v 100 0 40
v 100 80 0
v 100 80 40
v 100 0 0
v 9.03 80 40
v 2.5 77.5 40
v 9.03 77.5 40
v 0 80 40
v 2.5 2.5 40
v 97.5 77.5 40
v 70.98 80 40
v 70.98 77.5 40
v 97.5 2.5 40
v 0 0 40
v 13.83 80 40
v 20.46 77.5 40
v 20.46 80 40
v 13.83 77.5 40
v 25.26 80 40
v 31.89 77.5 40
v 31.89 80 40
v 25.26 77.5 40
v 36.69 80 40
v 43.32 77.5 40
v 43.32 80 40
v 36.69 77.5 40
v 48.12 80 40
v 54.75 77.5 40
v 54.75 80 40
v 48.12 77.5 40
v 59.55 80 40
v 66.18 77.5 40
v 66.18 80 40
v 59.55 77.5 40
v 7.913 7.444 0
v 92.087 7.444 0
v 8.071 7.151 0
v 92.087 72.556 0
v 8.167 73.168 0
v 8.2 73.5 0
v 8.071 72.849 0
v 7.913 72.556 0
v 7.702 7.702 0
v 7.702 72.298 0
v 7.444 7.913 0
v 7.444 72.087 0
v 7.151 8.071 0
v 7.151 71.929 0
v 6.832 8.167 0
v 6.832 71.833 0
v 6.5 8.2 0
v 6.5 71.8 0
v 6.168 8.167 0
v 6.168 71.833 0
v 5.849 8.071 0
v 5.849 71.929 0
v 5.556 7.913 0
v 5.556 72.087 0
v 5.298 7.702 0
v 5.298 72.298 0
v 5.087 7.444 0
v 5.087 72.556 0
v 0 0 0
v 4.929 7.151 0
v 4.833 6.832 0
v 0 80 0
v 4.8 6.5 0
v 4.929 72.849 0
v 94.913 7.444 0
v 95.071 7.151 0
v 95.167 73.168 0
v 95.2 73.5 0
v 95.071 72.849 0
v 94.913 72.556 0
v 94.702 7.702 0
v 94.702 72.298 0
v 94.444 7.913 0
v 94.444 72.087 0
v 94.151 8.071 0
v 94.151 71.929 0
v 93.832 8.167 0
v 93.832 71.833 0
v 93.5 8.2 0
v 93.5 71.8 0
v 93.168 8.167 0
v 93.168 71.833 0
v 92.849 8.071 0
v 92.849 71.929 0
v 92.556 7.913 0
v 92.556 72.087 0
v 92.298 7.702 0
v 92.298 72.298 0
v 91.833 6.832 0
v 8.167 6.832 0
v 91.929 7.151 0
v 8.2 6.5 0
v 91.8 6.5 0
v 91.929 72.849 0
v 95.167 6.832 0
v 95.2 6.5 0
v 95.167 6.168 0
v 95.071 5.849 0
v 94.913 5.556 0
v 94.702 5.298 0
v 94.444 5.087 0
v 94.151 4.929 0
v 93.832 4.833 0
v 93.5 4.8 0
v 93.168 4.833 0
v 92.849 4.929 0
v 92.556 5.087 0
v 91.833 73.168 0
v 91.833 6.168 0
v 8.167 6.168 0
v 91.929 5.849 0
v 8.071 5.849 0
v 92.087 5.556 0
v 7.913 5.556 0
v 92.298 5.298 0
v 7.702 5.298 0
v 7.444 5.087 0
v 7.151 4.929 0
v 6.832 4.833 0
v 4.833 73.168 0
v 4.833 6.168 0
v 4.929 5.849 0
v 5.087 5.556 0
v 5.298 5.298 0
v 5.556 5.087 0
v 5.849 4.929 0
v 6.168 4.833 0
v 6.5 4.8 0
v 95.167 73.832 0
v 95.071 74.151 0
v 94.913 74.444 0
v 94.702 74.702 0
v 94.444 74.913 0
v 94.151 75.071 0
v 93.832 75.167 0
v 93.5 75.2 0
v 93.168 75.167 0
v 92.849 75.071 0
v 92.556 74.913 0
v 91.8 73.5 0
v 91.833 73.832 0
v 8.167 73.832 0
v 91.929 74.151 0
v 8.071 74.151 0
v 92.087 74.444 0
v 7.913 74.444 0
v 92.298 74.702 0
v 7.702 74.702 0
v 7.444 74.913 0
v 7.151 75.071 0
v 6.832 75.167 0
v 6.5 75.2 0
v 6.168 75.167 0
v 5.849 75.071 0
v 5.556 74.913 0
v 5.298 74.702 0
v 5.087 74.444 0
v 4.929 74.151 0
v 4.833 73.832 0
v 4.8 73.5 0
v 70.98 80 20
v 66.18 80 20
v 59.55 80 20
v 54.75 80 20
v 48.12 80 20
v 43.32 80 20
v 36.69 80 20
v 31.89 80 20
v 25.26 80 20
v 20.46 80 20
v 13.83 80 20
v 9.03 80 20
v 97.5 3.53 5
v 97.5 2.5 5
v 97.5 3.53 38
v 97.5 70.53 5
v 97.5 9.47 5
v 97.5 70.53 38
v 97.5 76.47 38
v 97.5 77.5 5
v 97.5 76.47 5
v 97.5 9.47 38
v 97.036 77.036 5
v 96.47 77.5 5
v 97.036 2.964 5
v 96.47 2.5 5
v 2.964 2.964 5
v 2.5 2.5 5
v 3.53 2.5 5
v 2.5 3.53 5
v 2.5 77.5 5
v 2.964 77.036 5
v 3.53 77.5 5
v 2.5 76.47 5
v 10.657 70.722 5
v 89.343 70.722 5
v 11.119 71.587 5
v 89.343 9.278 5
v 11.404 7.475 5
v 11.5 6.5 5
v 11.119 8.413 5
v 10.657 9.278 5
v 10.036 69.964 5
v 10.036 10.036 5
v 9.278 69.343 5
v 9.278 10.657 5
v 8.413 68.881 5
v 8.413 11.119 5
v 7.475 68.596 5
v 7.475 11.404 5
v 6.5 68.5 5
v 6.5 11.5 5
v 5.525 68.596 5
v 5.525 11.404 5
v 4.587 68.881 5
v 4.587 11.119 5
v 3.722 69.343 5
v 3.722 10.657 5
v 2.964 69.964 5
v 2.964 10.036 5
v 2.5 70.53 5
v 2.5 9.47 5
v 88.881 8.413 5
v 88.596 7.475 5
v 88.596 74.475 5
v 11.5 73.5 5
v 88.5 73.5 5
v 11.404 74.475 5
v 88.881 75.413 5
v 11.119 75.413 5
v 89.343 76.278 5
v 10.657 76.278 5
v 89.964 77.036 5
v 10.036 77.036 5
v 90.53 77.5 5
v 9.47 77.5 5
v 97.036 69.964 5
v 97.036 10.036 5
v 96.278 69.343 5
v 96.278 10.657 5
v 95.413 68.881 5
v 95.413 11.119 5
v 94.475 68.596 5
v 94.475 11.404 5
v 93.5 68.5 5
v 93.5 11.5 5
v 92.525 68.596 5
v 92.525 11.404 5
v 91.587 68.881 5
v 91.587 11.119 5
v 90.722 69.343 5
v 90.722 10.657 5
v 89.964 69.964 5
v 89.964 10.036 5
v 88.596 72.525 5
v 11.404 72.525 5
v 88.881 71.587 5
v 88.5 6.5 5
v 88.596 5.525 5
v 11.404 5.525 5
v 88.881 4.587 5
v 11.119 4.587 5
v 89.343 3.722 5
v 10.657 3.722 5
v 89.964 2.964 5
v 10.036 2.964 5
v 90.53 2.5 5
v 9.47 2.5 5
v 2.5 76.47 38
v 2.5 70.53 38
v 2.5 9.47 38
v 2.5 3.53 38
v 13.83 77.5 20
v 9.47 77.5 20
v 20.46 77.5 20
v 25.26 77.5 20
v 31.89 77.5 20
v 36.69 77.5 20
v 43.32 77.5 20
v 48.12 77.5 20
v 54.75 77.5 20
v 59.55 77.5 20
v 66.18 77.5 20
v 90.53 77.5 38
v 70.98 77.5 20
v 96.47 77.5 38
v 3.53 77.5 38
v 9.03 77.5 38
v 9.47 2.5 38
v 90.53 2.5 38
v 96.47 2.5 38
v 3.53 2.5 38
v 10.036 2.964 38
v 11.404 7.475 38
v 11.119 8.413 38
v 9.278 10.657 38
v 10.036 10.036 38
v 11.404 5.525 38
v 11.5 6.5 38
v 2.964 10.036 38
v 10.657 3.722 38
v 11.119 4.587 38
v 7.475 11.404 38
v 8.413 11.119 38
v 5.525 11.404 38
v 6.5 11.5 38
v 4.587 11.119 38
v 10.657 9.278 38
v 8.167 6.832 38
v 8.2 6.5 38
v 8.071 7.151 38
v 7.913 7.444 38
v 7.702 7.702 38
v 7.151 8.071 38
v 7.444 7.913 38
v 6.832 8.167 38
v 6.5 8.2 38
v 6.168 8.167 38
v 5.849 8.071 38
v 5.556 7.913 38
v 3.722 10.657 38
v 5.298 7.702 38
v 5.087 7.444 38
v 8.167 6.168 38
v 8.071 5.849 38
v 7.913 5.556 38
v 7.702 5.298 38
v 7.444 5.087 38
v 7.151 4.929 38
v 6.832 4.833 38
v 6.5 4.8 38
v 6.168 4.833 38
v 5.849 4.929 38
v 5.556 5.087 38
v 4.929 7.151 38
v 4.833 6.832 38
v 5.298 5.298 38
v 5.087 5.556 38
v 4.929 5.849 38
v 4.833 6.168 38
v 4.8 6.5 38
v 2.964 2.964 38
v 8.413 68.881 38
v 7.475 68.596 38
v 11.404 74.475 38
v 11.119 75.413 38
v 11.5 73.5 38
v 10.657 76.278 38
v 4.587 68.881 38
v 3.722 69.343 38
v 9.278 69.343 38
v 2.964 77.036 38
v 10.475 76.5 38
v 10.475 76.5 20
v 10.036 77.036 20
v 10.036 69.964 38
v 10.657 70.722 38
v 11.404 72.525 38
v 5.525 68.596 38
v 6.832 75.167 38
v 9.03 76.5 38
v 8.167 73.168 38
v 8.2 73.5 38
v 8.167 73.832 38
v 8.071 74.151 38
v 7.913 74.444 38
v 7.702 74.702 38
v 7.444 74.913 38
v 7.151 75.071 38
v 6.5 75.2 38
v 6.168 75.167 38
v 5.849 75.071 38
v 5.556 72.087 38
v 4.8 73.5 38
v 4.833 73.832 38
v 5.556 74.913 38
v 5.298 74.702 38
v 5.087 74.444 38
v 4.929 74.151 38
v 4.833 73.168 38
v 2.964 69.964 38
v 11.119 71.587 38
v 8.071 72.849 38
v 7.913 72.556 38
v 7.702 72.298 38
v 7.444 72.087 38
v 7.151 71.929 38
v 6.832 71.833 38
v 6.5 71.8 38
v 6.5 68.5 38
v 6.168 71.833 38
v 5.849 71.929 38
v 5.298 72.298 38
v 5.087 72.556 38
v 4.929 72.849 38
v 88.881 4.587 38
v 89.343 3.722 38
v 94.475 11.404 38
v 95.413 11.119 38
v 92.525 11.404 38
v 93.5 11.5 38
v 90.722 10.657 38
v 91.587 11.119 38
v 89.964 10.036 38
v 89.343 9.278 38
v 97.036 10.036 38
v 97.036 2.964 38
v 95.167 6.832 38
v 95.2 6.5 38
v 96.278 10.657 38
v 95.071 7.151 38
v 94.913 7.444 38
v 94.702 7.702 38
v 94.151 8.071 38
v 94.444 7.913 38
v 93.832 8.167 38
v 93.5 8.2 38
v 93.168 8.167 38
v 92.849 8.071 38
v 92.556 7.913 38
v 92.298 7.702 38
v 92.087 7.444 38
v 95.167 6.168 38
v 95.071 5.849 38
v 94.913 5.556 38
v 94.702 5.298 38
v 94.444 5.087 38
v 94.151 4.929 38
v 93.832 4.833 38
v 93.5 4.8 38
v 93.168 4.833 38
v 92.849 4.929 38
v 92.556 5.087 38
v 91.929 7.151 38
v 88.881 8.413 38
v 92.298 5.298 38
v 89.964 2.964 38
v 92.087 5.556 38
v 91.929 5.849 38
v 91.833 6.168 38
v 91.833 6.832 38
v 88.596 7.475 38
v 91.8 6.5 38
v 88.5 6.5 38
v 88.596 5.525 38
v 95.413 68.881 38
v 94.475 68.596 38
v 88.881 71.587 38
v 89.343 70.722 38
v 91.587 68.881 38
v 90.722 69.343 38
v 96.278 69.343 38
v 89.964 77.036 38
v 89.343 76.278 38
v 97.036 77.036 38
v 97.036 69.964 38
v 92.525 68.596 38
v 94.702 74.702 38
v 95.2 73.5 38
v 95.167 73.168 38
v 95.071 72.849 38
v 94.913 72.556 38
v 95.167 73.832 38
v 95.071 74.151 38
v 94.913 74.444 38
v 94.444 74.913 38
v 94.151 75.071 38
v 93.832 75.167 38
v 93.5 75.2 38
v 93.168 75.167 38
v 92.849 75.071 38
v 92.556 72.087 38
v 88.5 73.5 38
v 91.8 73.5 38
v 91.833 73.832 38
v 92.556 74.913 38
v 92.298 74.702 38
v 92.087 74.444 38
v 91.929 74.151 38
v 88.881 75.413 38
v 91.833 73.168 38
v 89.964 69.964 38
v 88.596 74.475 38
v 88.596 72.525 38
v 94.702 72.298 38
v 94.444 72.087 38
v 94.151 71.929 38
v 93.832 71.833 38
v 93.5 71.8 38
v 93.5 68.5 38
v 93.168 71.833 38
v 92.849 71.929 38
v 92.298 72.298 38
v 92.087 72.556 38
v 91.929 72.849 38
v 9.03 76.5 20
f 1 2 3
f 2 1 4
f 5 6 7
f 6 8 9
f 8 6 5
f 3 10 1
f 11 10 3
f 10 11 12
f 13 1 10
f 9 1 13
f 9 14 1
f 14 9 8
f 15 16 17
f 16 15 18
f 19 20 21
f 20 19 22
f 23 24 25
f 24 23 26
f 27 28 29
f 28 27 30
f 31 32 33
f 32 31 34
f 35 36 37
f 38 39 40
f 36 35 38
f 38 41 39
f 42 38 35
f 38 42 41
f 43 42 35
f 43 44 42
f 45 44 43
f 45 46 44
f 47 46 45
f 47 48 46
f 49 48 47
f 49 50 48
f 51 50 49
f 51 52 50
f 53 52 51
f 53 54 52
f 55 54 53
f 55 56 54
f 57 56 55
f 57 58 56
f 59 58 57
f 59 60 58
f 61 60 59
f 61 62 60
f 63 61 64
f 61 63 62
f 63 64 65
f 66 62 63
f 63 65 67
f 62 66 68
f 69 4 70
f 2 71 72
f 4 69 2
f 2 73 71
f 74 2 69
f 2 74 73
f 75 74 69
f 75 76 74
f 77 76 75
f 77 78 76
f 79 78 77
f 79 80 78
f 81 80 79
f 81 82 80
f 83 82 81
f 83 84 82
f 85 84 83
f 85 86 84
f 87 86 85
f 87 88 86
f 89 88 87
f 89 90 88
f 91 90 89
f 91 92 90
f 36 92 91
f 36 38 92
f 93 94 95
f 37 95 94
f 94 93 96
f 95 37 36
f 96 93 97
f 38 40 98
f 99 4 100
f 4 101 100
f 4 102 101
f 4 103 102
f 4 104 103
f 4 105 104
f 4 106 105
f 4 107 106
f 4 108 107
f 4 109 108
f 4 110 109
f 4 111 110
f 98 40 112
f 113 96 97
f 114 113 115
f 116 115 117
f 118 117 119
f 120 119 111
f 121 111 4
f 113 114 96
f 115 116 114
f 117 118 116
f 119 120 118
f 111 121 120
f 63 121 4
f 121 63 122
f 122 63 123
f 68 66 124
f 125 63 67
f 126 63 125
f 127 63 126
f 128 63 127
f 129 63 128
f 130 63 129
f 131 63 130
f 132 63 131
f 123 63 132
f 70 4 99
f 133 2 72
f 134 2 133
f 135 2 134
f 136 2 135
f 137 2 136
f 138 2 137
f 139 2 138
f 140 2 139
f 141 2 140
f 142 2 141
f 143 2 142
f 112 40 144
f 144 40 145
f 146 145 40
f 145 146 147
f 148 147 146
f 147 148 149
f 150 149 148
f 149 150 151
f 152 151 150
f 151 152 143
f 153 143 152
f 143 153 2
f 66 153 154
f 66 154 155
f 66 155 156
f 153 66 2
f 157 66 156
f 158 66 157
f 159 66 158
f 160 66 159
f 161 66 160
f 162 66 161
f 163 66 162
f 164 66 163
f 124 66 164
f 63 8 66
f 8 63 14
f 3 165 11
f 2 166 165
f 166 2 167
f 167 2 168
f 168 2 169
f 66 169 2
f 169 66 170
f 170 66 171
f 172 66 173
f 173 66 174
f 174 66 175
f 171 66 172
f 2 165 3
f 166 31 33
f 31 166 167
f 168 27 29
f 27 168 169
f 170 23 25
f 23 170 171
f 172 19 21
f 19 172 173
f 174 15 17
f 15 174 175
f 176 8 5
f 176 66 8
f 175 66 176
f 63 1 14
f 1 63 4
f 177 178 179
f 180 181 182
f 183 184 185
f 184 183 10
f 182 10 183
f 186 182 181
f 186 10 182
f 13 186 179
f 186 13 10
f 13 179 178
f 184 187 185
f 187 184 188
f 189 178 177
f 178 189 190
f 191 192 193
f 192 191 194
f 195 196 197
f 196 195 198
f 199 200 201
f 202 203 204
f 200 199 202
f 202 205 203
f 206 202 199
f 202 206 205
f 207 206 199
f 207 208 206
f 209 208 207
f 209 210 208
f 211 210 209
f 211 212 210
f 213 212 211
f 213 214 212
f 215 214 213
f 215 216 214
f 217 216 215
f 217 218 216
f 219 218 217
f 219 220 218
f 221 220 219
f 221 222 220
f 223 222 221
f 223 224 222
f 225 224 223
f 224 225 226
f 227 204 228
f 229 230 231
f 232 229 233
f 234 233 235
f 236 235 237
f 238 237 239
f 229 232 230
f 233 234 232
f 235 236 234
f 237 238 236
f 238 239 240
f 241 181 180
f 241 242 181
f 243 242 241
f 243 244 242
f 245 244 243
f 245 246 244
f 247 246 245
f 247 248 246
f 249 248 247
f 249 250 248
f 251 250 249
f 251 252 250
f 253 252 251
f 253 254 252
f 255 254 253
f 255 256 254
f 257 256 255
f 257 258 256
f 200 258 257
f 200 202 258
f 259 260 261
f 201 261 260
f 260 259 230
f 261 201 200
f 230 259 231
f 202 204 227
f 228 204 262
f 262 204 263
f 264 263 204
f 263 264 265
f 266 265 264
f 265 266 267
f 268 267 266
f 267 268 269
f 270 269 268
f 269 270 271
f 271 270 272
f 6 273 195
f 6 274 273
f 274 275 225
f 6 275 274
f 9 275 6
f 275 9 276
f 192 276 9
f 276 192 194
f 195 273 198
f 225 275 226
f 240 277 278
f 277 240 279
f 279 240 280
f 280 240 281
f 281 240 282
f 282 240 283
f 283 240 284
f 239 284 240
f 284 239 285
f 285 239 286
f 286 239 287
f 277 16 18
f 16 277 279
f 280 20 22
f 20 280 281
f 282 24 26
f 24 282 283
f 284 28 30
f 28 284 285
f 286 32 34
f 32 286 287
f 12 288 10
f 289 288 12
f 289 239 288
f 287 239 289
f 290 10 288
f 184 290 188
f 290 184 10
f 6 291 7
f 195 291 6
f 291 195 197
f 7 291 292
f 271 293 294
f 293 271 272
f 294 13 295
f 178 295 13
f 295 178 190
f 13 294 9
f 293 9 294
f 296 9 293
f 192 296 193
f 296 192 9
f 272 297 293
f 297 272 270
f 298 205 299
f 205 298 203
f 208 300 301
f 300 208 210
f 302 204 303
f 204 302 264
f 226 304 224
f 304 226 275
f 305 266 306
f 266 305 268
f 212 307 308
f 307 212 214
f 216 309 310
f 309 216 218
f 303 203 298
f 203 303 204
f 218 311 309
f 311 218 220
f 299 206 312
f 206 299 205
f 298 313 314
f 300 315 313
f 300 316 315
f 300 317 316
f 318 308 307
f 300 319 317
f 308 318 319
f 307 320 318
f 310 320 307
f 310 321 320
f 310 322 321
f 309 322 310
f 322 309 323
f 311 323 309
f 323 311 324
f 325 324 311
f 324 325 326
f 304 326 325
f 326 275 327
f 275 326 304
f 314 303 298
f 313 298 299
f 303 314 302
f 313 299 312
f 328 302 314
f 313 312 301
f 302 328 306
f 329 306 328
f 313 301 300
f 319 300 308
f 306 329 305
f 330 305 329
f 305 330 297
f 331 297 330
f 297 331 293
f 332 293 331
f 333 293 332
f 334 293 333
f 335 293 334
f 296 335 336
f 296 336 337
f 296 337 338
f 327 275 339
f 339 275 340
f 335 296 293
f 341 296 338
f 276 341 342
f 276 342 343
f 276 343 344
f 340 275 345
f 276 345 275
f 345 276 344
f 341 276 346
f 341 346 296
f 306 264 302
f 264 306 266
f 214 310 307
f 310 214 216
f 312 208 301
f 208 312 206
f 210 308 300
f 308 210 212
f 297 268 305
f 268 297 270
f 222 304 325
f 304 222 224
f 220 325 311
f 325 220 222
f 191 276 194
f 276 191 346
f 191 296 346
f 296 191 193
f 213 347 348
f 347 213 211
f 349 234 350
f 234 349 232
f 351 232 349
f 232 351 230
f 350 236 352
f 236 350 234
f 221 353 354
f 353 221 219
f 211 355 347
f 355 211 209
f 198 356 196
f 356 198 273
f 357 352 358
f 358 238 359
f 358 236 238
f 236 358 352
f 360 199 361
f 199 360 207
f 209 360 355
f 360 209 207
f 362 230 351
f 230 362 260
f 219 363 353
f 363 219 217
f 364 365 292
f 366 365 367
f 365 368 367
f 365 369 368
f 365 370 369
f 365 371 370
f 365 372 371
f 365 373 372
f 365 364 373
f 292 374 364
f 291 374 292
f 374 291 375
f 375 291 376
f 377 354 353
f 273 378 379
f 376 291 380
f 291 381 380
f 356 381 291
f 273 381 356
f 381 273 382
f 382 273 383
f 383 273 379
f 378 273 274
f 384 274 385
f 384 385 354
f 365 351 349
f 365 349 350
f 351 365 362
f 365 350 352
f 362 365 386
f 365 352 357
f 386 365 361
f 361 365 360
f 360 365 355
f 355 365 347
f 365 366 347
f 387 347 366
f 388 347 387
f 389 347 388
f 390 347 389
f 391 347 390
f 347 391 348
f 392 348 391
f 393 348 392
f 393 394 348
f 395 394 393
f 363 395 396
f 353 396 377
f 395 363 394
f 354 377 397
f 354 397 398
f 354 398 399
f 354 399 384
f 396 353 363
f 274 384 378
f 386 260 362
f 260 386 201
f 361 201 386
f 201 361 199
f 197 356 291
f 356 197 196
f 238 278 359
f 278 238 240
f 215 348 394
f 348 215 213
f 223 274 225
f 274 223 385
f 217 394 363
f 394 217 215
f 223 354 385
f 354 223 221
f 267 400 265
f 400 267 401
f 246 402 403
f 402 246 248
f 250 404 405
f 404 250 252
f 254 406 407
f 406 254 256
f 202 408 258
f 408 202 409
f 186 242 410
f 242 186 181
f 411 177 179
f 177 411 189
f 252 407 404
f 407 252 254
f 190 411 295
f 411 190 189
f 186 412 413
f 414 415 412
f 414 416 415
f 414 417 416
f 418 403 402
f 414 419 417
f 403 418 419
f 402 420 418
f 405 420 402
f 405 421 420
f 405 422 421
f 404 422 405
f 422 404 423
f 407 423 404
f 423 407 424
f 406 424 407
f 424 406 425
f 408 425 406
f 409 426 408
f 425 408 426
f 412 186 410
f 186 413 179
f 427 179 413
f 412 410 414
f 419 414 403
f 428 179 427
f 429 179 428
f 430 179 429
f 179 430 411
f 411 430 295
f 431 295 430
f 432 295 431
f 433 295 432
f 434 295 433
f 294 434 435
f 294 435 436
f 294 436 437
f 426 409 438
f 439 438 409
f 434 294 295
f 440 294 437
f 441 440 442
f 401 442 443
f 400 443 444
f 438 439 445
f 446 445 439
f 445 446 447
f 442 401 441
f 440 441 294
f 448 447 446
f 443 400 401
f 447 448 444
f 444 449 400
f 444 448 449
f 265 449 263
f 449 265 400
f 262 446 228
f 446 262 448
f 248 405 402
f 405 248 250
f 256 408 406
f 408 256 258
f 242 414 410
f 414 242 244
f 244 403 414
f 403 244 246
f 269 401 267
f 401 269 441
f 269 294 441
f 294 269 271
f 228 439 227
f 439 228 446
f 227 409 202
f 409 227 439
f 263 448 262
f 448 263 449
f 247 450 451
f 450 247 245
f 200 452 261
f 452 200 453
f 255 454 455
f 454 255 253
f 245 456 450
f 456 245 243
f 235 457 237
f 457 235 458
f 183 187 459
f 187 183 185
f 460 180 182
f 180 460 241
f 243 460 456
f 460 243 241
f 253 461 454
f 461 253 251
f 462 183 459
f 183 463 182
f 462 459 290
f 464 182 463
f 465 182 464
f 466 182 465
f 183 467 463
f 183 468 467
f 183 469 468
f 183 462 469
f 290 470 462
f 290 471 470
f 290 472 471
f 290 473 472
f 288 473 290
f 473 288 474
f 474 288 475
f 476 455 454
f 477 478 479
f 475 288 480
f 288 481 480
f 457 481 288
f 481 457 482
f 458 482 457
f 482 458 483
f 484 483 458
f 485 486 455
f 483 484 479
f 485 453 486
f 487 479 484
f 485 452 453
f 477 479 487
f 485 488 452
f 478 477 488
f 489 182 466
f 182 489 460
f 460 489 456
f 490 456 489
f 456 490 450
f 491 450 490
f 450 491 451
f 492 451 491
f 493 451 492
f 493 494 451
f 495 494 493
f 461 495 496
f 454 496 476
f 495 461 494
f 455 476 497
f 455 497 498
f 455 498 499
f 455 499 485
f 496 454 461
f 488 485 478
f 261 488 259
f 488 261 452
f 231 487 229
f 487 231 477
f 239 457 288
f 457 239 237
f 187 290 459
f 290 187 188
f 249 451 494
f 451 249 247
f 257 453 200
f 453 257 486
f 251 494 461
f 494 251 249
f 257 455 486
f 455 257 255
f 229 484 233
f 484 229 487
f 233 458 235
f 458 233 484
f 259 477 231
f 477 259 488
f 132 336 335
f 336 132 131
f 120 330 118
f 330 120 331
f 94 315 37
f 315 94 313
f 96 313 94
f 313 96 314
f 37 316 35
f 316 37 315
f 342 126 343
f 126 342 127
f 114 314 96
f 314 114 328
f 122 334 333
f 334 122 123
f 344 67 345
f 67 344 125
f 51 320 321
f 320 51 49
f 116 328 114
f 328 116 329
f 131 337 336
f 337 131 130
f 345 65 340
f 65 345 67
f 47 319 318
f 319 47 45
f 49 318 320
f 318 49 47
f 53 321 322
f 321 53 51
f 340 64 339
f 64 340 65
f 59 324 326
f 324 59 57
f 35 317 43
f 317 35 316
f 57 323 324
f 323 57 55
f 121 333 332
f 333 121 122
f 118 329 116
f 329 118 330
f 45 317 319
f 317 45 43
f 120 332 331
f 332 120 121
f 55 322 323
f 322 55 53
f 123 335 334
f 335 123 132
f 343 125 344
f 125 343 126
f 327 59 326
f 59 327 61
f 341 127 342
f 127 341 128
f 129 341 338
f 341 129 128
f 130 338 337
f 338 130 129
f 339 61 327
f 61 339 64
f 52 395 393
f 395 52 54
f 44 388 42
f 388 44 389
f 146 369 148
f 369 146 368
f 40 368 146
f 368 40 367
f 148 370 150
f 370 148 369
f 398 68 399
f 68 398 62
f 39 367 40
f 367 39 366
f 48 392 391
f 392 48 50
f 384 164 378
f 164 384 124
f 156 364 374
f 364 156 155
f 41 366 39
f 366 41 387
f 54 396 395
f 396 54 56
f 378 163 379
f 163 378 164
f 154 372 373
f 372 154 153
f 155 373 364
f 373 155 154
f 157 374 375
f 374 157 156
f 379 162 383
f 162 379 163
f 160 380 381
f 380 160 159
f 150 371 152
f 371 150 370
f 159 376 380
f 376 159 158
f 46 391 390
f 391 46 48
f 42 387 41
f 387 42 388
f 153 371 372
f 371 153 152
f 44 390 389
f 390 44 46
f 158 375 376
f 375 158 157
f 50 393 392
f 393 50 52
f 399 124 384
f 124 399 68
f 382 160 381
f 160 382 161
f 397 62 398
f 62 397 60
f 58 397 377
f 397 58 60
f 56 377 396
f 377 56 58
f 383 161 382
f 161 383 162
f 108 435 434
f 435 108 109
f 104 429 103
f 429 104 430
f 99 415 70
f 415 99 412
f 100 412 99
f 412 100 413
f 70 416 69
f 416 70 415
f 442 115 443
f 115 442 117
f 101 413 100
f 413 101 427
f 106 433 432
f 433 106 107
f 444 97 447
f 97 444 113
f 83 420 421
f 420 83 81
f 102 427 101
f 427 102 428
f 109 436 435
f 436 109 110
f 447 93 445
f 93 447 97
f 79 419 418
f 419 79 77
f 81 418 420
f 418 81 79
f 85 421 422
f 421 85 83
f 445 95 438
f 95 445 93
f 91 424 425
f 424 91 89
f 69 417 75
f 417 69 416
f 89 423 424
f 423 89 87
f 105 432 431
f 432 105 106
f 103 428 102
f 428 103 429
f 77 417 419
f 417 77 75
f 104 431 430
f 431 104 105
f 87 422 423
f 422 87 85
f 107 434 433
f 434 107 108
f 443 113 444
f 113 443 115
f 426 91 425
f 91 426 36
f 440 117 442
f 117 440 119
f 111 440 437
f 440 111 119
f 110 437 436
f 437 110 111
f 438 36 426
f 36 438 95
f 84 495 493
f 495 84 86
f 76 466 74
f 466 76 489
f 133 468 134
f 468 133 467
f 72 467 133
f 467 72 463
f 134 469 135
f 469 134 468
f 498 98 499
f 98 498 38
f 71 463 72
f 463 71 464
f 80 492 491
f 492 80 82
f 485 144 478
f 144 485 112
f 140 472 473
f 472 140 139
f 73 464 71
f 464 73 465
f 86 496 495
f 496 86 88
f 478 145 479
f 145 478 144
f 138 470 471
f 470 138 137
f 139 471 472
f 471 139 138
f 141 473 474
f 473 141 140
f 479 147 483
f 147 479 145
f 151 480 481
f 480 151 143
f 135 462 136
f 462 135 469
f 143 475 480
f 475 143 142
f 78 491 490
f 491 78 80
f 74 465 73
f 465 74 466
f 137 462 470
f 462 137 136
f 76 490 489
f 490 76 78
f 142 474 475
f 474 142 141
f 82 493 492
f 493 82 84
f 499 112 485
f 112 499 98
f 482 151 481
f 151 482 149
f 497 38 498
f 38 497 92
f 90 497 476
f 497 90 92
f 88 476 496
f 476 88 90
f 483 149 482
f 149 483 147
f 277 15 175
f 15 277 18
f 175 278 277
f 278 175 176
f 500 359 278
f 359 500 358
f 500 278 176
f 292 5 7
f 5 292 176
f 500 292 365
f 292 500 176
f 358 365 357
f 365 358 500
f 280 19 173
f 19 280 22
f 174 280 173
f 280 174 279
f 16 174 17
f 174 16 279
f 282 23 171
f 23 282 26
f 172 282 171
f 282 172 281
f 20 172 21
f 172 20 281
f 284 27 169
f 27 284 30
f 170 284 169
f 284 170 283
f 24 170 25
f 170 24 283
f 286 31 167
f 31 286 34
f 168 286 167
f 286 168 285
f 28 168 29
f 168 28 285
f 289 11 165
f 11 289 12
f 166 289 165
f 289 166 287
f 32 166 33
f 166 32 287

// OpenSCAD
$fn = 32;

// ----------------------------------------------------------------------
// Enclosure body: 100 x 80 x 40 mm, wall 2.5 mm
// ----------------------------------------------------------------------

// --- parameters (mm) ---
length = 100;             // outside length, X
width = 80;               // outside width, Y
height = 40;              // outside height, Z
wall = 2.5;               // side wall thickness
floor_t = 5;              // floor thickness
boss_d = 10;              // corner boss diameter
boss_h = 33;              // corner boss height above the floor
boss_hole_d = 3.4;        // lid screw clearance in the boss
boss_lip = 6.5;           // boss centre inset from the corner
vent_slots = 6;           // vent slots in the long wall
vent_w = 4.8;             // vent slot width
vent_h = 20;              // vent slot height
vent_pitch = 11.43;       // vent slot pitch
vent_z = 20;              // vent slot sill height

module shell() {
  difference() {
    cube([length, width, height]);
    /* hollow, open at the top */
    translate([wall, wall, floor_t])
      cube([length - 2 * wall, width - 2 * wall, height]);
  }
}

module bosses() {
  /* corner bosses, sunk 1 mm into the floor */
  for (sx = [0, 1]) for (sy = [0, 1])
    translate([sx * (length - 2 * boss_lip) + boss_lip, sy * (width - 2 * boss_lip) + boss_lip, floor_t - 1])
      cylinder(h = boss_h + 1, d = boss_d);
}

difference() {
  union() {
    shell();
    bosses();
  }
  /* boss screw holes */
  for (sx = [0, 1]) for (sy = [0, 1])
    translate([sx * (length - 2 * boss_lip) + boss_lip, sy * (width - 2 * boss_lip) + boss_lip, -1]) cylinder(h = floor_t + boss_h + 2, d = boss_hole_d);
  /* vent grille in the +Y wall */
  for (i = [0 : vent_slots - 1]) translate([vent_pitch * (i + 1) - vent_w / 2, width - wall - 1, vent_z]) cube([vent_w, wall + 2, vent_h]);
}
